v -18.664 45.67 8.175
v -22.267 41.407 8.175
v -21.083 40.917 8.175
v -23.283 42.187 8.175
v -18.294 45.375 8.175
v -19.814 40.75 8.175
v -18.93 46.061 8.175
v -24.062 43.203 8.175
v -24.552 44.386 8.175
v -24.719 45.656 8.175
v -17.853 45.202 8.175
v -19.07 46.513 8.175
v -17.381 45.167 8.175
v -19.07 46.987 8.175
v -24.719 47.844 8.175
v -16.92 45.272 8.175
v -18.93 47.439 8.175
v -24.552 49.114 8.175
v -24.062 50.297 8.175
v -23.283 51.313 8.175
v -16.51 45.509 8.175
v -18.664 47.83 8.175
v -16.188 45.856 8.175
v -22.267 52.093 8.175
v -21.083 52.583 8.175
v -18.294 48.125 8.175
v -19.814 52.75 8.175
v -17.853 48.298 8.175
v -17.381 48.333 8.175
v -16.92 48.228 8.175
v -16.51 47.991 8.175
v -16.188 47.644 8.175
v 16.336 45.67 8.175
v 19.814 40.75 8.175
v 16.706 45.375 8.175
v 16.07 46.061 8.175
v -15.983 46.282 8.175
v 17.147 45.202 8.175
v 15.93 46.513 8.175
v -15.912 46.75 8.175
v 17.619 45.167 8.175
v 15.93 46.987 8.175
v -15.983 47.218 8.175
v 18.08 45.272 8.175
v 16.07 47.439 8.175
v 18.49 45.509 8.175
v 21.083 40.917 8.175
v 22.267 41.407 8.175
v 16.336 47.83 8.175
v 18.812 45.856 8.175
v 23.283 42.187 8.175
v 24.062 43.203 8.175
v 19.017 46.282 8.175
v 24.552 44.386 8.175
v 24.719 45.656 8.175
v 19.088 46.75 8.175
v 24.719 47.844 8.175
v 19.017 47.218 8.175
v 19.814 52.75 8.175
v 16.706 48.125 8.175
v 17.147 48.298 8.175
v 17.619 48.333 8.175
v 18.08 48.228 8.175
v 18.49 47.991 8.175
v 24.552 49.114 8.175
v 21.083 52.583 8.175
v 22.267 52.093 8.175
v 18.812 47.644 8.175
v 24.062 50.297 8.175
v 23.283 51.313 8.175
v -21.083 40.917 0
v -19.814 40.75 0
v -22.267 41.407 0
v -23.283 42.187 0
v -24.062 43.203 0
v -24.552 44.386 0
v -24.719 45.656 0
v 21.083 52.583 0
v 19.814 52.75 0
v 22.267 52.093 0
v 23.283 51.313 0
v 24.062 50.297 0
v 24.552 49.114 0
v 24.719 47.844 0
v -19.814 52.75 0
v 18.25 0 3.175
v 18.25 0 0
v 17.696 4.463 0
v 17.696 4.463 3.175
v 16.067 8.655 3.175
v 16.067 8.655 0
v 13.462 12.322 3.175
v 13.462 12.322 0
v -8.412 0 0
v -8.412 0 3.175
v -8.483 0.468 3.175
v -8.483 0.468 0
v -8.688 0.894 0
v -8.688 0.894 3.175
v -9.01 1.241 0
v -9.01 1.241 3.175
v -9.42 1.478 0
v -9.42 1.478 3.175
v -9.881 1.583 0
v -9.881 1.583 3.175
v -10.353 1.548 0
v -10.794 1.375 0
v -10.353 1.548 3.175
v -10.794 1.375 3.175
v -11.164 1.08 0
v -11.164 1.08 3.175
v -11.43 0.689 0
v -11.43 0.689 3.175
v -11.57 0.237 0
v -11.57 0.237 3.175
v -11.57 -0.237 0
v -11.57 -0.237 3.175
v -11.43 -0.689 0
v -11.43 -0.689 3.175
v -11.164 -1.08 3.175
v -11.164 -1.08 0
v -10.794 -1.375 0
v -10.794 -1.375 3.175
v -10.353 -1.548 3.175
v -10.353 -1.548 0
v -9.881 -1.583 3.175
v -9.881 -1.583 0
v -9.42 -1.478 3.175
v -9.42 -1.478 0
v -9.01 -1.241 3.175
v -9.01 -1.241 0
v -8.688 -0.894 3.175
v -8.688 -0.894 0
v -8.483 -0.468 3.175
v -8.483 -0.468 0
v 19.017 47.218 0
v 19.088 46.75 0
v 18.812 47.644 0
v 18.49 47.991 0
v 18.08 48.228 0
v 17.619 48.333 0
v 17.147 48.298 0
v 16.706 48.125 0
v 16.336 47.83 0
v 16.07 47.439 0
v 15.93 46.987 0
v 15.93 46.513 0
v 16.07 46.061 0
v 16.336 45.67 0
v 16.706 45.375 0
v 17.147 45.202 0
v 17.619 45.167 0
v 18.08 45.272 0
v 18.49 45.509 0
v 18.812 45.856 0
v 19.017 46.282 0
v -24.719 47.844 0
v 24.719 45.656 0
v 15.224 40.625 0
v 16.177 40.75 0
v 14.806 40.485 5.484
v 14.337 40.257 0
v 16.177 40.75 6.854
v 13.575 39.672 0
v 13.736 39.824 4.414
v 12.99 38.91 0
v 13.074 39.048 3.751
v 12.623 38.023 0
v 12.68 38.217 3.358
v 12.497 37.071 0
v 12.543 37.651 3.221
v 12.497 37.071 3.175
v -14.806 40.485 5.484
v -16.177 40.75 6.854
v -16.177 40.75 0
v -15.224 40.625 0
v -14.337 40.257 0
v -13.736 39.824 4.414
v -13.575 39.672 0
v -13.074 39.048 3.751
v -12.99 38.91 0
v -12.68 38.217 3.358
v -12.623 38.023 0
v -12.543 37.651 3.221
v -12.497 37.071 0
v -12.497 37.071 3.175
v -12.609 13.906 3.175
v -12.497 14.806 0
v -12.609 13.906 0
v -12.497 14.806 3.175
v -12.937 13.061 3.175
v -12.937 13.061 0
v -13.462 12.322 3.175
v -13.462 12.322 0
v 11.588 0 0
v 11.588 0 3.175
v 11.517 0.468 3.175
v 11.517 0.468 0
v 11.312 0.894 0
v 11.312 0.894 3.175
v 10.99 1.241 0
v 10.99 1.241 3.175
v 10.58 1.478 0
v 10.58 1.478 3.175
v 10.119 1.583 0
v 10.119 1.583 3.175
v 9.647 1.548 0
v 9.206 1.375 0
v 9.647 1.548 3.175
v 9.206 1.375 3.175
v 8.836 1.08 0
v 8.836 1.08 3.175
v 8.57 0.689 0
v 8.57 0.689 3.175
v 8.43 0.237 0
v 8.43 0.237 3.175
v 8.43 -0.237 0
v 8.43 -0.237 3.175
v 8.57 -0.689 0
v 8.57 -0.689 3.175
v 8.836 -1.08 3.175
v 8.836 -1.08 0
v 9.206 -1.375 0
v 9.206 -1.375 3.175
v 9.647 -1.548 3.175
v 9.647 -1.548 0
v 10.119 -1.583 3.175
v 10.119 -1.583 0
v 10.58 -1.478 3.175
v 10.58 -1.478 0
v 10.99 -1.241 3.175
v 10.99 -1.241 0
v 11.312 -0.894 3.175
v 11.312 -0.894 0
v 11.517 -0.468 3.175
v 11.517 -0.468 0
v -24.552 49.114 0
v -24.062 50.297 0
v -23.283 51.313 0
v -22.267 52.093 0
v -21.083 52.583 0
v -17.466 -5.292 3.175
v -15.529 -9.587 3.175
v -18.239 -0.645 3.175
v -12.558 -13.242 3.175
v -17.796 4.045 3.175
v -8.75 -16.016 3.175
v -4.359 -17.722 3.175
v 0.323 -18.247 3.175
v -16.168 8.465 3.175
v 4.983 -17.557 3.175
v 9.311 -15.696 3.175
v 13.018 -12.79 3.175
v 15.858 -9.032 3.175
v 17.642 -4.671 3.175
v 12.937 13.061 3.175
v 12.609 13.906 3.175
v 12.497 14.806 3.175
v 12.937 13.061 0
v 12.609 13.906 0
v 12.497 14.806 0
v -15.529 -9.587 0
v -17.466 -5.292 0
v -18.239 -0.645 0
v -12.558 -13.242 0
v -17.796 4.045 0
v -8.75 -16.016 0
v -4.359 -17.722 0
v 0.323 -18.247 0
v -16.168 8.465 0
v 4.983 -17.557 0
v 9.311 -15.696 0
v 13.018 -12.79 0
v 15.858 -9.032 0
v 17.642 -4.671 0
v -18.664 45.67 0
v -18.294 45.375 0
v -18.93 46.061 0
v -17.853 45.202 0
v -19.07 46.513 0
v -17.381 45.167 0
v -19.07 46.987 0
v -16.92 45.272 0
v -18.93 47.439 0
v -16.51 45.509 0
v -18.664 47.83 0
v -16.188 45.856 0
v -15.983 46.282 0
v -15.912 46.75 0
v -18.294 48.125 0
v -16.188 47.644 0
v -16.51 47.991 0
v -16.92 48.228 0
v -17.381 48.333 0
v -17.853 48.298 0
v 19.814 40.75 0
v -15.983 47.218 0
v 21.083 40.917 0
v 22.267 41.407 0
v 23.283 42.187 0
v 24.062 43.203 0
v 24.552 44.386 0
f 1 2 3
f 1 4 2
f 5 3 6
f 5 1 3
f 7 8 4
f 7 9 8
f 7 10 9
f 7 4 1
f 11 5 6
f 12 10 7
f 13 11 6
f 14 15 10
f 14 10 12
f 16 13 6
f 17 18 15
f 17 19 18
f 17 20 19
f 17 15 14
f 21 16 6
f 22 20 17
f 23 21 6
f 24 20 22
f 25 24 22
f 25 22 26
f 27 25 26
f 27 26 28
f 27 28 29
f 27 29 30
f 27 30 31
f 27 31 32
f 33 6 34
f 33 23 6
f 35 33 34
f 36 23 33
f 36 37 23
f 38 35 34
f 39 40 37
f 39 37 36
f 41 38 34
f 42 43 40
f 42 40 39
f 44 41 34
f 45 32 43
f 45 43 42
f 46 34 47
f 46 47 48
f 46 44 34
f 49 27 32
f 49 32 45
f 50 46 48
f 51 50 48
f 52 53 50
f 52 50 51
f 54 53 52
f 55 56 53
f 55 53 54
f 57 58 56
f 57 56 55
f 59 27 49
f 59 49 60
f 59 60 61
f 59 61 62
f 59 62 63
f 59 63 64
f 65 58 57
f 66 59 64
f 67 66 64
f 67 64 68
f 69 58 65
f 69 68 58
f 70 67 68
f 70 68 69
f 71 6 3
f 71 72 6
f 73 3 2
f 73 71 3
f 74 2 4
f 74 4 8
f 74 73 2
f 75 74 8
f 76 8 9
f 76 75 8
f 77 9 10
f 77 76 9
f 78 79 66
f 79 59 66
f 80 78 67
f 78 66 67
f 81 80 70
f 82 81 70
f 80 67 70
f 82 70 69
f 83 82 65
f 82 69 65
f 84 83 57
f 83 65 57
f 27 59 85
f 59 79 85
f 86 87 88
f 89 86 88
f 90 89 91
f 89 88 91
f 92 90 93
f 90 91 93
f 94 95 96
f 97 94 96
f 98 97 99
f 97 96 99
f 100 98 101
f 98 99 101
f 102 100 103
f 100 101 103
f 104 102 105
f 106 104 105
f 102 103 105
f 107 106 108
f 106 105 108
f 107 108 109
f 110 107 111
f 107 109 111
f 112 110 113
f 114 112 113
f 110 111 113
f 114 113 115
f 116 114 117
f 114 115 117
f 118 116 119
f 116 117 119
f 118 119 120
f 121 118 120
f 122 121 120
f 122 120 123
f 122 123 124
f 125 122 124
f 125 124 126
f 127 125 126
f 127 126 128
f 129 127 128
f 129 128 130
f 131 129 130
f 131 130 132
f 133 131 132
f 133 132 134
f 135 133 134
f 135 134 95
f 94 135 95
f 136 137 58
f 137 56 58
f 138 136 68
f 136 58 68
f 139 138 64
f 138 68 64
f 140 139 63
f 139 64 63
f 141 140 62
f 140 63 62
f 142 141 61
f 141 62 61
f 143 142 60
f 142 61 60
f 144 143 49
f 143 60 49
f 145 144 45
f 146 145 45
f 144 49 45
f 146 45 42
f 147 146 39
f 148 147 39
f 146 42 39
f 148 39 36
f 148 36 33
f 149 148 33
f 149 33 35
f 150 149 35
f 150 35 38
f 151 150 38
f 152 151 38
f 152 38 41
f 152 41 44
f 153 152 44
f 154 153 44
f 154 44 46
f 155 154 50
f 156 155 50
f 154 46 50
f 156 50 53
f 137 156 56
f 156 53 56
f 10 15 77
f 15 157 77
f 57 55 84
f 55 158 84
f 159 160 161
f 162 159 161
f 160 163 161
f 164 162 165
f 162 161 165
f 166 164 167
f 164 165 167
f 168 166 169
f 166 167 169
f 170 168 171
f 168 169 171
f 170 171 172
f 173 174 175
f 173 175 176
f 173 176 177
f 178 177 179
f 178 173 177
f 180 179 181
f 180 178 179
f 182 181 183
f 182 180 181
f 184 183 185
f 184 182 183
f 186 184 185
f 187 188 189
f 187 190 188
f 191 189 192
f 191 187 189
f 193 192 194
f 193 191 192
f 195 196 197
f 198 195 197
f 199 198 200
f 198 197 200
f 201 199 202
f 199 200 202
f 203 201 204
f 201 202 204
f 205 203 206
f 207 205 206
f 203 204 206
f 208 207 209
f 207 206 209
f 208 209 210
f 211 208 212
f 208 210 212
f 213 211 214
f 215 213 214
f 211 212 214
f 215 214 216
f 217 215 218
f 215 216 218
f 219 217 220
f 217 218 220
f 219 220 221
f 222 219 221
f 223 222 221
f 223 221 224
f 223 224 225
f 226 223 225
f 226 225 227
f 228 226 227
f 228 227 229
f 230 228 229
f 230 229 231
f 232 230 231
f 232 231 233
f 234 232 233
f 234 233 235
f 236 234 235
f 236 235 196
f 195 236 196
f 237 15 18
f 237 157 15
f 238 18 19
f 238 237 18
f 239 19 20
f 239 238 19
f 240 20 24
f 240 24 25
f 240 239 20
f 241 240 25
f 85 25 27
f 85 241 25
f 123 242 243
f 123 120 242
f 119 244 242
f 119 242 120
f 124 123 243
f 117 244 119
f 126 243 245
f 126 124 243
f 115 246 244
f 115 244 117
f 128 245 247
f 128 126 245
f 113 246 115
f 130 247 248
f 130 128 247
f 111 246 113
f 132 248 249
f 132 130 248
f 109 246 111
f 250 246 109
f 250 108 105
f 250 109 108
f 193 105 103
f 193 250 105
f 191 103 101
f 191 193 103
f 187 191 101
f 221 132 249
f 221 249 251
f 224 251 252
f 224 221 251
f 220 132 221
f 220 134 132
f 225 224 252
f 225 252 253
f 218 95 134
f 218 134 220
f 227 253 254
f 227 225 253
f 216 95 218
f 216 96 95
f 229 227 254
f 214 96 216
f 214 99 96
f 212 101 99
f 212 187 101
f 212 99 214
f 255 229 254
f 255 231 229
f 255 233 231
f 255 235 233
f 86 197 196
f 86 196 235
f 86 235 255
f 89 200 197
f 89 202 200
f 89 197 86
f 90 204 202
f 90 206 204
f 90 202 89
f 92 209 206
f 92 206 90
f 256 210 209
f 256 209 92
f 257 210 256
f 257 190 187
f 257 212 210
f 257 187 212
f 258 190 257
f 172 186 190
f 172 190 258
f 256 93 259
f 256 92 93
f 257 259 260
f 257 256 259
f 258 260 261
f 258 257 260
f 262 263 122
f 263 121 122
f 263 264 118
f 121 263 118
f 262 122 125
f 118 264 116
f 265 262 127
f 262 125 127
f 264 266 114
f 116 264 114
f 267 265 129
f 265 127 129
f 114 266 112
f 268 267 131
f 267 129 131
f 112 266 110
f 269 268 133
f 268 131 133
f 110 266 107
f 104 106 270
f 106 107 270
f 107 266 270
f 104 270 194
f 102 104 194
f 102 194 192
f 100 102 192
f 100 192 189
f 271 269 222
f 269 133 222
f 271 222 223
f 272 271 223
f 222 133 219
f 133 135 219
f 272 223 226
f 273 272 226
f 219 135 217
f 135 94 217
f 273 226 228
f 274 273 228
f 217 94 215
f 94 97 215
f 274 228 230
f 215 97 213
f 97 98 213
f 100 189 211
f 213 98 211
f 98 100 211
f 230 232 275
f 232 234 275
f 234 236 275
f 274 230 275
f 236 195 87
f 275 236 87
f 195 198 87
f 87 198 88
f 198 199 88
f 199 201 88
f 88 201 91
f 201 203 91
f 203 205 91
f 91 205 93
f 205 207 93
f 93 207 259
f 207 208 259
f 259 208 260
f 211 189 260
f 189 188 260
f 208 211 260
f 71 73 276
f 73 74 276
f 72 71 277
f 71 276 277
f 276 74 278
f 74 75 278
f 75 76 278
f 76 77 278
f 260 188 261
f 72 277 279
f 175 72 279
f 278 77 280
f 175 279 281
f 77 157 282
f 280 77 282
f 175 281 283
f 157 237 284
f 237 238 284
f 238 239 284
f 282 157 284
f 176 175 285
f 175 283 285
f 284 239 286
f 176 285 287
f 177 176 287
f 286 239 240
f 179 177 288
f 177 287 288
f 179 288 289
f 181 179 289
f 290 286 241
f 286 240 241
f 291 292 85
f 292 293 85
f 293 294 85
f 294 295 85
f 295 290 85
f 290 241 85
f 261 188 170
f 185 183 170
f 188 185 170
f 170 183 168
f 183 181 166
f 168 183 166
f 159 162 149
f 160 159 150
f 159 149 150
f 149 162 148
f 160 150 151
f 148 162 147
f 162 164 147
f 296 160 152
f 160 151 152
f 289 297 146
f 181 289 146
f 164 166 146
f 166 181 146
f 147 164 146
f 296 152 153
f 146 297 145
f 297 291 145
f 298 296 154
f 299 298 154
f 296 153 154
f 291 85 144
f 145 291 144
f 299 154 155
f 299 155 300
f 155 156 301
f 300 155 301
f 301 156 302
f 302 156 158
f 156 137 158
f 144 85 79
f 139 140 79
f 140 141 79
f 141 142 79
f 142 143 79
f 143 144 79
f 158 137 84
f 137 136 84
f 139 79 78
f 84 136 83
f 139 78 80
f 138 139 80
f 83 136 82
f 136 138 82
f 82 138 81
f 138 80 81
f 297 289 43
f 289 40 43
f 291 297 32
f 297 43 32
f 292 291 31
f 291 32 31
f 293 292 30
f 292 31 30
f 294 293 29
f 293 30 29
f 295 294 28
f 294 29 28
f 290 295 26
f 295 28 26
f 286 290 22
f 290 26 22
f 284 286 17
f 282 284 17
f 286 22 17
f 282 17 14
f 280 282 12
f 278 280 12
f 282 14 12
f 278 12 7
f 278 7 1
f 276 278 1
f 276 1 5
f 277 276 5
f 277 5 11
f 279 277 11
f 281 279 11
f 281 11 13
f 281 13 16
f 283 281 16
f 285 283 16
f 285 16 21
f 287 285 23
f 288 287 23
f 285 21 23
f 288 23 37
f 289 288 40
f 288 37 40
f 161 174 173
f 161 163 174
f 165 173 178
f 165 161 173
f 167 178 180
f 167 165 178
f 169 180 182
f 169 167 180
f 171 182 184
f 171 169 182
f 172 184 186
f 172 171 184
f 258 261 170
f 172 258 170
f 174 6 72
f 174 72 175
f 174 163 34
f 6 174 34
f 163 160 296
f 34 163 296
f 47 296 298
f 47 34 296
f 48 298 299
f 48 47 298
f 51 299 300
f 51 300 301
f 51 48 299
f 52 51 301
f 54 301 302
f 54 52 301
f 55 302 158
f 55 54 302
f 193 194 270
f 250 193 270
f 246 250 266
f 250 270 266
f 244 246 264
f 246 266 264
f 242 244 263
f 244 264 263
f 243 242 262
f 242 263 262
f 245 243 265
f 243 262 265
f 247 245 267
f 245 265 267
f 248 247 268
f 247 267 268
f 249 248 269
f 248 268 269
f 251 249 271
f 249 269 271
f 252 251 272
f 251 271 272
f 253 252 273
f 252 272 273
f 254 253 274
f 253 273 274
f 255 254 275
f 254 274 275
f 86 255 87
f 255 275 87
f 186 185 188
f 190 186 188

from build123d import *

# Parameters (mm, degrees)
F1_DEPTH = 3.175
F3_DEPTH = 5
F4_R     = 3.6792614691
F5_R     = 1.5875
F6_DEPTH = 24.13
F7_DEPTH = 25.4
F8_R     = 4.9056819587


with BuildPart() as f1:
    # F0 (on Top) → F1 (new body)
    with BuildSketch(Plane.XY):
        with BuildLine():
            ThreePointArc((-12.4973059814, 13.2996181602), (0, 18.25), (12.4973059814, 13.2996181602))
            Line((12.4973059814, 13.2996181602), (12.4973059814, 40.75))
            Line((12.4973059814, 40.75), (24.7193473562, 40.75))
            Line((24.7193473562, 40.75), (24.7193473562, 52.75))
            Line((24.7193473562, 52.75), (-24.7193473562, 52.75))
            Line((-24.7193473562, 52.75), (-24.7193473562, 40.75))
            Line((-24.7193473562, 40.75), (-12.4973059814, 40.75))
            Line((-12.4973059814, 40.75), (-12.4973059814, 13.2996181602))
        make_face()
        with BuildLine():
            ThreePointArc((-12.4973059814, 13.2996181602), (-7.2452282862, -16.7501990161), (18.25, 0))
            ThreePointArc((18.25, 0), (16.7501990161, 7.2452282862), (12.4973059814, 13.2996181602))
            ThreePointArc((12.4973059814, 13.2996181602), (0, 18.25), (-12.4973059814, 13.2996181602))
        make_face()
    extrude(amount=F1_DEPTH)

    # F2 (on face) → F3 (join)
    with BuildSketch(Plane.XY.offset(3.175)):
        Polygon((-24.7193473562, 40.75), (-12.4973059814, 40.75), (12.4973059814, 40.75), (24.7193473562, 40.75), (24.7193473562, 52.75), (-24.7193473562, 52.75), align=None)
    extrude(amount=F3_DEPTH)

    # F4
    f4_edges = [f1.edges().sort_by_distance(p)[0] for p in [
        (12.497306, 13.299618, 1.5875),
        (-12.497306, 13.299618, 1.5875),
        (12.497306, 40.75, 1.5875),
        (0, 40.75, 3.175),
        (-12.497306, 40.75, 1.5875),
    ]]
    fillet(f4_edges, radius=F4_R)

    # F5 (on face) → F6 (cut)
    with BuildSketch(Plane.XY.offset(3.175)):
        with Locations((-10, 0)):
            Circle(F5_R)
        with Locations((10, 0)):
            Circle(F5_R)
        with Locations((17.5, 46.75)):
            Circle(F5_R)
        with Locations((-17.5, 46.75)):
            Circle(F5_R)
    extrude(amount=F6_DEPTH, mode=Mode.SUBTRACT)

    # F5 (on face) → F7 (cut)
    with BuildSketch(Plane.XY.offset(3.175)):
        with Locations((-10, 0)):
            Circle(F5_R)
        with Locations((10, 0)):
            Circle(F5_R)
        with Locations((17.5, 46.75)):
            Circle(F5_R)
        with Locations((-17.5, 46.75)):
            Circle(F5_R)
    extrude(amount=-F7_DEPTH, mode=Mode.SUBTRACT)

    # F8
    f8_edges = [f1.edges().sort_by_distance(p)[0] for p in [
        (24.719347, 40.75, 4.0875),
        (24.719347, 52.75, 4.0875),
        (-24.719347, 52.75, 4.0875),
        (-24.719347, 40.75, 4.0875),
    ]]
    fillet(f8_edges, radius=F8_R)


solid = f1.part
